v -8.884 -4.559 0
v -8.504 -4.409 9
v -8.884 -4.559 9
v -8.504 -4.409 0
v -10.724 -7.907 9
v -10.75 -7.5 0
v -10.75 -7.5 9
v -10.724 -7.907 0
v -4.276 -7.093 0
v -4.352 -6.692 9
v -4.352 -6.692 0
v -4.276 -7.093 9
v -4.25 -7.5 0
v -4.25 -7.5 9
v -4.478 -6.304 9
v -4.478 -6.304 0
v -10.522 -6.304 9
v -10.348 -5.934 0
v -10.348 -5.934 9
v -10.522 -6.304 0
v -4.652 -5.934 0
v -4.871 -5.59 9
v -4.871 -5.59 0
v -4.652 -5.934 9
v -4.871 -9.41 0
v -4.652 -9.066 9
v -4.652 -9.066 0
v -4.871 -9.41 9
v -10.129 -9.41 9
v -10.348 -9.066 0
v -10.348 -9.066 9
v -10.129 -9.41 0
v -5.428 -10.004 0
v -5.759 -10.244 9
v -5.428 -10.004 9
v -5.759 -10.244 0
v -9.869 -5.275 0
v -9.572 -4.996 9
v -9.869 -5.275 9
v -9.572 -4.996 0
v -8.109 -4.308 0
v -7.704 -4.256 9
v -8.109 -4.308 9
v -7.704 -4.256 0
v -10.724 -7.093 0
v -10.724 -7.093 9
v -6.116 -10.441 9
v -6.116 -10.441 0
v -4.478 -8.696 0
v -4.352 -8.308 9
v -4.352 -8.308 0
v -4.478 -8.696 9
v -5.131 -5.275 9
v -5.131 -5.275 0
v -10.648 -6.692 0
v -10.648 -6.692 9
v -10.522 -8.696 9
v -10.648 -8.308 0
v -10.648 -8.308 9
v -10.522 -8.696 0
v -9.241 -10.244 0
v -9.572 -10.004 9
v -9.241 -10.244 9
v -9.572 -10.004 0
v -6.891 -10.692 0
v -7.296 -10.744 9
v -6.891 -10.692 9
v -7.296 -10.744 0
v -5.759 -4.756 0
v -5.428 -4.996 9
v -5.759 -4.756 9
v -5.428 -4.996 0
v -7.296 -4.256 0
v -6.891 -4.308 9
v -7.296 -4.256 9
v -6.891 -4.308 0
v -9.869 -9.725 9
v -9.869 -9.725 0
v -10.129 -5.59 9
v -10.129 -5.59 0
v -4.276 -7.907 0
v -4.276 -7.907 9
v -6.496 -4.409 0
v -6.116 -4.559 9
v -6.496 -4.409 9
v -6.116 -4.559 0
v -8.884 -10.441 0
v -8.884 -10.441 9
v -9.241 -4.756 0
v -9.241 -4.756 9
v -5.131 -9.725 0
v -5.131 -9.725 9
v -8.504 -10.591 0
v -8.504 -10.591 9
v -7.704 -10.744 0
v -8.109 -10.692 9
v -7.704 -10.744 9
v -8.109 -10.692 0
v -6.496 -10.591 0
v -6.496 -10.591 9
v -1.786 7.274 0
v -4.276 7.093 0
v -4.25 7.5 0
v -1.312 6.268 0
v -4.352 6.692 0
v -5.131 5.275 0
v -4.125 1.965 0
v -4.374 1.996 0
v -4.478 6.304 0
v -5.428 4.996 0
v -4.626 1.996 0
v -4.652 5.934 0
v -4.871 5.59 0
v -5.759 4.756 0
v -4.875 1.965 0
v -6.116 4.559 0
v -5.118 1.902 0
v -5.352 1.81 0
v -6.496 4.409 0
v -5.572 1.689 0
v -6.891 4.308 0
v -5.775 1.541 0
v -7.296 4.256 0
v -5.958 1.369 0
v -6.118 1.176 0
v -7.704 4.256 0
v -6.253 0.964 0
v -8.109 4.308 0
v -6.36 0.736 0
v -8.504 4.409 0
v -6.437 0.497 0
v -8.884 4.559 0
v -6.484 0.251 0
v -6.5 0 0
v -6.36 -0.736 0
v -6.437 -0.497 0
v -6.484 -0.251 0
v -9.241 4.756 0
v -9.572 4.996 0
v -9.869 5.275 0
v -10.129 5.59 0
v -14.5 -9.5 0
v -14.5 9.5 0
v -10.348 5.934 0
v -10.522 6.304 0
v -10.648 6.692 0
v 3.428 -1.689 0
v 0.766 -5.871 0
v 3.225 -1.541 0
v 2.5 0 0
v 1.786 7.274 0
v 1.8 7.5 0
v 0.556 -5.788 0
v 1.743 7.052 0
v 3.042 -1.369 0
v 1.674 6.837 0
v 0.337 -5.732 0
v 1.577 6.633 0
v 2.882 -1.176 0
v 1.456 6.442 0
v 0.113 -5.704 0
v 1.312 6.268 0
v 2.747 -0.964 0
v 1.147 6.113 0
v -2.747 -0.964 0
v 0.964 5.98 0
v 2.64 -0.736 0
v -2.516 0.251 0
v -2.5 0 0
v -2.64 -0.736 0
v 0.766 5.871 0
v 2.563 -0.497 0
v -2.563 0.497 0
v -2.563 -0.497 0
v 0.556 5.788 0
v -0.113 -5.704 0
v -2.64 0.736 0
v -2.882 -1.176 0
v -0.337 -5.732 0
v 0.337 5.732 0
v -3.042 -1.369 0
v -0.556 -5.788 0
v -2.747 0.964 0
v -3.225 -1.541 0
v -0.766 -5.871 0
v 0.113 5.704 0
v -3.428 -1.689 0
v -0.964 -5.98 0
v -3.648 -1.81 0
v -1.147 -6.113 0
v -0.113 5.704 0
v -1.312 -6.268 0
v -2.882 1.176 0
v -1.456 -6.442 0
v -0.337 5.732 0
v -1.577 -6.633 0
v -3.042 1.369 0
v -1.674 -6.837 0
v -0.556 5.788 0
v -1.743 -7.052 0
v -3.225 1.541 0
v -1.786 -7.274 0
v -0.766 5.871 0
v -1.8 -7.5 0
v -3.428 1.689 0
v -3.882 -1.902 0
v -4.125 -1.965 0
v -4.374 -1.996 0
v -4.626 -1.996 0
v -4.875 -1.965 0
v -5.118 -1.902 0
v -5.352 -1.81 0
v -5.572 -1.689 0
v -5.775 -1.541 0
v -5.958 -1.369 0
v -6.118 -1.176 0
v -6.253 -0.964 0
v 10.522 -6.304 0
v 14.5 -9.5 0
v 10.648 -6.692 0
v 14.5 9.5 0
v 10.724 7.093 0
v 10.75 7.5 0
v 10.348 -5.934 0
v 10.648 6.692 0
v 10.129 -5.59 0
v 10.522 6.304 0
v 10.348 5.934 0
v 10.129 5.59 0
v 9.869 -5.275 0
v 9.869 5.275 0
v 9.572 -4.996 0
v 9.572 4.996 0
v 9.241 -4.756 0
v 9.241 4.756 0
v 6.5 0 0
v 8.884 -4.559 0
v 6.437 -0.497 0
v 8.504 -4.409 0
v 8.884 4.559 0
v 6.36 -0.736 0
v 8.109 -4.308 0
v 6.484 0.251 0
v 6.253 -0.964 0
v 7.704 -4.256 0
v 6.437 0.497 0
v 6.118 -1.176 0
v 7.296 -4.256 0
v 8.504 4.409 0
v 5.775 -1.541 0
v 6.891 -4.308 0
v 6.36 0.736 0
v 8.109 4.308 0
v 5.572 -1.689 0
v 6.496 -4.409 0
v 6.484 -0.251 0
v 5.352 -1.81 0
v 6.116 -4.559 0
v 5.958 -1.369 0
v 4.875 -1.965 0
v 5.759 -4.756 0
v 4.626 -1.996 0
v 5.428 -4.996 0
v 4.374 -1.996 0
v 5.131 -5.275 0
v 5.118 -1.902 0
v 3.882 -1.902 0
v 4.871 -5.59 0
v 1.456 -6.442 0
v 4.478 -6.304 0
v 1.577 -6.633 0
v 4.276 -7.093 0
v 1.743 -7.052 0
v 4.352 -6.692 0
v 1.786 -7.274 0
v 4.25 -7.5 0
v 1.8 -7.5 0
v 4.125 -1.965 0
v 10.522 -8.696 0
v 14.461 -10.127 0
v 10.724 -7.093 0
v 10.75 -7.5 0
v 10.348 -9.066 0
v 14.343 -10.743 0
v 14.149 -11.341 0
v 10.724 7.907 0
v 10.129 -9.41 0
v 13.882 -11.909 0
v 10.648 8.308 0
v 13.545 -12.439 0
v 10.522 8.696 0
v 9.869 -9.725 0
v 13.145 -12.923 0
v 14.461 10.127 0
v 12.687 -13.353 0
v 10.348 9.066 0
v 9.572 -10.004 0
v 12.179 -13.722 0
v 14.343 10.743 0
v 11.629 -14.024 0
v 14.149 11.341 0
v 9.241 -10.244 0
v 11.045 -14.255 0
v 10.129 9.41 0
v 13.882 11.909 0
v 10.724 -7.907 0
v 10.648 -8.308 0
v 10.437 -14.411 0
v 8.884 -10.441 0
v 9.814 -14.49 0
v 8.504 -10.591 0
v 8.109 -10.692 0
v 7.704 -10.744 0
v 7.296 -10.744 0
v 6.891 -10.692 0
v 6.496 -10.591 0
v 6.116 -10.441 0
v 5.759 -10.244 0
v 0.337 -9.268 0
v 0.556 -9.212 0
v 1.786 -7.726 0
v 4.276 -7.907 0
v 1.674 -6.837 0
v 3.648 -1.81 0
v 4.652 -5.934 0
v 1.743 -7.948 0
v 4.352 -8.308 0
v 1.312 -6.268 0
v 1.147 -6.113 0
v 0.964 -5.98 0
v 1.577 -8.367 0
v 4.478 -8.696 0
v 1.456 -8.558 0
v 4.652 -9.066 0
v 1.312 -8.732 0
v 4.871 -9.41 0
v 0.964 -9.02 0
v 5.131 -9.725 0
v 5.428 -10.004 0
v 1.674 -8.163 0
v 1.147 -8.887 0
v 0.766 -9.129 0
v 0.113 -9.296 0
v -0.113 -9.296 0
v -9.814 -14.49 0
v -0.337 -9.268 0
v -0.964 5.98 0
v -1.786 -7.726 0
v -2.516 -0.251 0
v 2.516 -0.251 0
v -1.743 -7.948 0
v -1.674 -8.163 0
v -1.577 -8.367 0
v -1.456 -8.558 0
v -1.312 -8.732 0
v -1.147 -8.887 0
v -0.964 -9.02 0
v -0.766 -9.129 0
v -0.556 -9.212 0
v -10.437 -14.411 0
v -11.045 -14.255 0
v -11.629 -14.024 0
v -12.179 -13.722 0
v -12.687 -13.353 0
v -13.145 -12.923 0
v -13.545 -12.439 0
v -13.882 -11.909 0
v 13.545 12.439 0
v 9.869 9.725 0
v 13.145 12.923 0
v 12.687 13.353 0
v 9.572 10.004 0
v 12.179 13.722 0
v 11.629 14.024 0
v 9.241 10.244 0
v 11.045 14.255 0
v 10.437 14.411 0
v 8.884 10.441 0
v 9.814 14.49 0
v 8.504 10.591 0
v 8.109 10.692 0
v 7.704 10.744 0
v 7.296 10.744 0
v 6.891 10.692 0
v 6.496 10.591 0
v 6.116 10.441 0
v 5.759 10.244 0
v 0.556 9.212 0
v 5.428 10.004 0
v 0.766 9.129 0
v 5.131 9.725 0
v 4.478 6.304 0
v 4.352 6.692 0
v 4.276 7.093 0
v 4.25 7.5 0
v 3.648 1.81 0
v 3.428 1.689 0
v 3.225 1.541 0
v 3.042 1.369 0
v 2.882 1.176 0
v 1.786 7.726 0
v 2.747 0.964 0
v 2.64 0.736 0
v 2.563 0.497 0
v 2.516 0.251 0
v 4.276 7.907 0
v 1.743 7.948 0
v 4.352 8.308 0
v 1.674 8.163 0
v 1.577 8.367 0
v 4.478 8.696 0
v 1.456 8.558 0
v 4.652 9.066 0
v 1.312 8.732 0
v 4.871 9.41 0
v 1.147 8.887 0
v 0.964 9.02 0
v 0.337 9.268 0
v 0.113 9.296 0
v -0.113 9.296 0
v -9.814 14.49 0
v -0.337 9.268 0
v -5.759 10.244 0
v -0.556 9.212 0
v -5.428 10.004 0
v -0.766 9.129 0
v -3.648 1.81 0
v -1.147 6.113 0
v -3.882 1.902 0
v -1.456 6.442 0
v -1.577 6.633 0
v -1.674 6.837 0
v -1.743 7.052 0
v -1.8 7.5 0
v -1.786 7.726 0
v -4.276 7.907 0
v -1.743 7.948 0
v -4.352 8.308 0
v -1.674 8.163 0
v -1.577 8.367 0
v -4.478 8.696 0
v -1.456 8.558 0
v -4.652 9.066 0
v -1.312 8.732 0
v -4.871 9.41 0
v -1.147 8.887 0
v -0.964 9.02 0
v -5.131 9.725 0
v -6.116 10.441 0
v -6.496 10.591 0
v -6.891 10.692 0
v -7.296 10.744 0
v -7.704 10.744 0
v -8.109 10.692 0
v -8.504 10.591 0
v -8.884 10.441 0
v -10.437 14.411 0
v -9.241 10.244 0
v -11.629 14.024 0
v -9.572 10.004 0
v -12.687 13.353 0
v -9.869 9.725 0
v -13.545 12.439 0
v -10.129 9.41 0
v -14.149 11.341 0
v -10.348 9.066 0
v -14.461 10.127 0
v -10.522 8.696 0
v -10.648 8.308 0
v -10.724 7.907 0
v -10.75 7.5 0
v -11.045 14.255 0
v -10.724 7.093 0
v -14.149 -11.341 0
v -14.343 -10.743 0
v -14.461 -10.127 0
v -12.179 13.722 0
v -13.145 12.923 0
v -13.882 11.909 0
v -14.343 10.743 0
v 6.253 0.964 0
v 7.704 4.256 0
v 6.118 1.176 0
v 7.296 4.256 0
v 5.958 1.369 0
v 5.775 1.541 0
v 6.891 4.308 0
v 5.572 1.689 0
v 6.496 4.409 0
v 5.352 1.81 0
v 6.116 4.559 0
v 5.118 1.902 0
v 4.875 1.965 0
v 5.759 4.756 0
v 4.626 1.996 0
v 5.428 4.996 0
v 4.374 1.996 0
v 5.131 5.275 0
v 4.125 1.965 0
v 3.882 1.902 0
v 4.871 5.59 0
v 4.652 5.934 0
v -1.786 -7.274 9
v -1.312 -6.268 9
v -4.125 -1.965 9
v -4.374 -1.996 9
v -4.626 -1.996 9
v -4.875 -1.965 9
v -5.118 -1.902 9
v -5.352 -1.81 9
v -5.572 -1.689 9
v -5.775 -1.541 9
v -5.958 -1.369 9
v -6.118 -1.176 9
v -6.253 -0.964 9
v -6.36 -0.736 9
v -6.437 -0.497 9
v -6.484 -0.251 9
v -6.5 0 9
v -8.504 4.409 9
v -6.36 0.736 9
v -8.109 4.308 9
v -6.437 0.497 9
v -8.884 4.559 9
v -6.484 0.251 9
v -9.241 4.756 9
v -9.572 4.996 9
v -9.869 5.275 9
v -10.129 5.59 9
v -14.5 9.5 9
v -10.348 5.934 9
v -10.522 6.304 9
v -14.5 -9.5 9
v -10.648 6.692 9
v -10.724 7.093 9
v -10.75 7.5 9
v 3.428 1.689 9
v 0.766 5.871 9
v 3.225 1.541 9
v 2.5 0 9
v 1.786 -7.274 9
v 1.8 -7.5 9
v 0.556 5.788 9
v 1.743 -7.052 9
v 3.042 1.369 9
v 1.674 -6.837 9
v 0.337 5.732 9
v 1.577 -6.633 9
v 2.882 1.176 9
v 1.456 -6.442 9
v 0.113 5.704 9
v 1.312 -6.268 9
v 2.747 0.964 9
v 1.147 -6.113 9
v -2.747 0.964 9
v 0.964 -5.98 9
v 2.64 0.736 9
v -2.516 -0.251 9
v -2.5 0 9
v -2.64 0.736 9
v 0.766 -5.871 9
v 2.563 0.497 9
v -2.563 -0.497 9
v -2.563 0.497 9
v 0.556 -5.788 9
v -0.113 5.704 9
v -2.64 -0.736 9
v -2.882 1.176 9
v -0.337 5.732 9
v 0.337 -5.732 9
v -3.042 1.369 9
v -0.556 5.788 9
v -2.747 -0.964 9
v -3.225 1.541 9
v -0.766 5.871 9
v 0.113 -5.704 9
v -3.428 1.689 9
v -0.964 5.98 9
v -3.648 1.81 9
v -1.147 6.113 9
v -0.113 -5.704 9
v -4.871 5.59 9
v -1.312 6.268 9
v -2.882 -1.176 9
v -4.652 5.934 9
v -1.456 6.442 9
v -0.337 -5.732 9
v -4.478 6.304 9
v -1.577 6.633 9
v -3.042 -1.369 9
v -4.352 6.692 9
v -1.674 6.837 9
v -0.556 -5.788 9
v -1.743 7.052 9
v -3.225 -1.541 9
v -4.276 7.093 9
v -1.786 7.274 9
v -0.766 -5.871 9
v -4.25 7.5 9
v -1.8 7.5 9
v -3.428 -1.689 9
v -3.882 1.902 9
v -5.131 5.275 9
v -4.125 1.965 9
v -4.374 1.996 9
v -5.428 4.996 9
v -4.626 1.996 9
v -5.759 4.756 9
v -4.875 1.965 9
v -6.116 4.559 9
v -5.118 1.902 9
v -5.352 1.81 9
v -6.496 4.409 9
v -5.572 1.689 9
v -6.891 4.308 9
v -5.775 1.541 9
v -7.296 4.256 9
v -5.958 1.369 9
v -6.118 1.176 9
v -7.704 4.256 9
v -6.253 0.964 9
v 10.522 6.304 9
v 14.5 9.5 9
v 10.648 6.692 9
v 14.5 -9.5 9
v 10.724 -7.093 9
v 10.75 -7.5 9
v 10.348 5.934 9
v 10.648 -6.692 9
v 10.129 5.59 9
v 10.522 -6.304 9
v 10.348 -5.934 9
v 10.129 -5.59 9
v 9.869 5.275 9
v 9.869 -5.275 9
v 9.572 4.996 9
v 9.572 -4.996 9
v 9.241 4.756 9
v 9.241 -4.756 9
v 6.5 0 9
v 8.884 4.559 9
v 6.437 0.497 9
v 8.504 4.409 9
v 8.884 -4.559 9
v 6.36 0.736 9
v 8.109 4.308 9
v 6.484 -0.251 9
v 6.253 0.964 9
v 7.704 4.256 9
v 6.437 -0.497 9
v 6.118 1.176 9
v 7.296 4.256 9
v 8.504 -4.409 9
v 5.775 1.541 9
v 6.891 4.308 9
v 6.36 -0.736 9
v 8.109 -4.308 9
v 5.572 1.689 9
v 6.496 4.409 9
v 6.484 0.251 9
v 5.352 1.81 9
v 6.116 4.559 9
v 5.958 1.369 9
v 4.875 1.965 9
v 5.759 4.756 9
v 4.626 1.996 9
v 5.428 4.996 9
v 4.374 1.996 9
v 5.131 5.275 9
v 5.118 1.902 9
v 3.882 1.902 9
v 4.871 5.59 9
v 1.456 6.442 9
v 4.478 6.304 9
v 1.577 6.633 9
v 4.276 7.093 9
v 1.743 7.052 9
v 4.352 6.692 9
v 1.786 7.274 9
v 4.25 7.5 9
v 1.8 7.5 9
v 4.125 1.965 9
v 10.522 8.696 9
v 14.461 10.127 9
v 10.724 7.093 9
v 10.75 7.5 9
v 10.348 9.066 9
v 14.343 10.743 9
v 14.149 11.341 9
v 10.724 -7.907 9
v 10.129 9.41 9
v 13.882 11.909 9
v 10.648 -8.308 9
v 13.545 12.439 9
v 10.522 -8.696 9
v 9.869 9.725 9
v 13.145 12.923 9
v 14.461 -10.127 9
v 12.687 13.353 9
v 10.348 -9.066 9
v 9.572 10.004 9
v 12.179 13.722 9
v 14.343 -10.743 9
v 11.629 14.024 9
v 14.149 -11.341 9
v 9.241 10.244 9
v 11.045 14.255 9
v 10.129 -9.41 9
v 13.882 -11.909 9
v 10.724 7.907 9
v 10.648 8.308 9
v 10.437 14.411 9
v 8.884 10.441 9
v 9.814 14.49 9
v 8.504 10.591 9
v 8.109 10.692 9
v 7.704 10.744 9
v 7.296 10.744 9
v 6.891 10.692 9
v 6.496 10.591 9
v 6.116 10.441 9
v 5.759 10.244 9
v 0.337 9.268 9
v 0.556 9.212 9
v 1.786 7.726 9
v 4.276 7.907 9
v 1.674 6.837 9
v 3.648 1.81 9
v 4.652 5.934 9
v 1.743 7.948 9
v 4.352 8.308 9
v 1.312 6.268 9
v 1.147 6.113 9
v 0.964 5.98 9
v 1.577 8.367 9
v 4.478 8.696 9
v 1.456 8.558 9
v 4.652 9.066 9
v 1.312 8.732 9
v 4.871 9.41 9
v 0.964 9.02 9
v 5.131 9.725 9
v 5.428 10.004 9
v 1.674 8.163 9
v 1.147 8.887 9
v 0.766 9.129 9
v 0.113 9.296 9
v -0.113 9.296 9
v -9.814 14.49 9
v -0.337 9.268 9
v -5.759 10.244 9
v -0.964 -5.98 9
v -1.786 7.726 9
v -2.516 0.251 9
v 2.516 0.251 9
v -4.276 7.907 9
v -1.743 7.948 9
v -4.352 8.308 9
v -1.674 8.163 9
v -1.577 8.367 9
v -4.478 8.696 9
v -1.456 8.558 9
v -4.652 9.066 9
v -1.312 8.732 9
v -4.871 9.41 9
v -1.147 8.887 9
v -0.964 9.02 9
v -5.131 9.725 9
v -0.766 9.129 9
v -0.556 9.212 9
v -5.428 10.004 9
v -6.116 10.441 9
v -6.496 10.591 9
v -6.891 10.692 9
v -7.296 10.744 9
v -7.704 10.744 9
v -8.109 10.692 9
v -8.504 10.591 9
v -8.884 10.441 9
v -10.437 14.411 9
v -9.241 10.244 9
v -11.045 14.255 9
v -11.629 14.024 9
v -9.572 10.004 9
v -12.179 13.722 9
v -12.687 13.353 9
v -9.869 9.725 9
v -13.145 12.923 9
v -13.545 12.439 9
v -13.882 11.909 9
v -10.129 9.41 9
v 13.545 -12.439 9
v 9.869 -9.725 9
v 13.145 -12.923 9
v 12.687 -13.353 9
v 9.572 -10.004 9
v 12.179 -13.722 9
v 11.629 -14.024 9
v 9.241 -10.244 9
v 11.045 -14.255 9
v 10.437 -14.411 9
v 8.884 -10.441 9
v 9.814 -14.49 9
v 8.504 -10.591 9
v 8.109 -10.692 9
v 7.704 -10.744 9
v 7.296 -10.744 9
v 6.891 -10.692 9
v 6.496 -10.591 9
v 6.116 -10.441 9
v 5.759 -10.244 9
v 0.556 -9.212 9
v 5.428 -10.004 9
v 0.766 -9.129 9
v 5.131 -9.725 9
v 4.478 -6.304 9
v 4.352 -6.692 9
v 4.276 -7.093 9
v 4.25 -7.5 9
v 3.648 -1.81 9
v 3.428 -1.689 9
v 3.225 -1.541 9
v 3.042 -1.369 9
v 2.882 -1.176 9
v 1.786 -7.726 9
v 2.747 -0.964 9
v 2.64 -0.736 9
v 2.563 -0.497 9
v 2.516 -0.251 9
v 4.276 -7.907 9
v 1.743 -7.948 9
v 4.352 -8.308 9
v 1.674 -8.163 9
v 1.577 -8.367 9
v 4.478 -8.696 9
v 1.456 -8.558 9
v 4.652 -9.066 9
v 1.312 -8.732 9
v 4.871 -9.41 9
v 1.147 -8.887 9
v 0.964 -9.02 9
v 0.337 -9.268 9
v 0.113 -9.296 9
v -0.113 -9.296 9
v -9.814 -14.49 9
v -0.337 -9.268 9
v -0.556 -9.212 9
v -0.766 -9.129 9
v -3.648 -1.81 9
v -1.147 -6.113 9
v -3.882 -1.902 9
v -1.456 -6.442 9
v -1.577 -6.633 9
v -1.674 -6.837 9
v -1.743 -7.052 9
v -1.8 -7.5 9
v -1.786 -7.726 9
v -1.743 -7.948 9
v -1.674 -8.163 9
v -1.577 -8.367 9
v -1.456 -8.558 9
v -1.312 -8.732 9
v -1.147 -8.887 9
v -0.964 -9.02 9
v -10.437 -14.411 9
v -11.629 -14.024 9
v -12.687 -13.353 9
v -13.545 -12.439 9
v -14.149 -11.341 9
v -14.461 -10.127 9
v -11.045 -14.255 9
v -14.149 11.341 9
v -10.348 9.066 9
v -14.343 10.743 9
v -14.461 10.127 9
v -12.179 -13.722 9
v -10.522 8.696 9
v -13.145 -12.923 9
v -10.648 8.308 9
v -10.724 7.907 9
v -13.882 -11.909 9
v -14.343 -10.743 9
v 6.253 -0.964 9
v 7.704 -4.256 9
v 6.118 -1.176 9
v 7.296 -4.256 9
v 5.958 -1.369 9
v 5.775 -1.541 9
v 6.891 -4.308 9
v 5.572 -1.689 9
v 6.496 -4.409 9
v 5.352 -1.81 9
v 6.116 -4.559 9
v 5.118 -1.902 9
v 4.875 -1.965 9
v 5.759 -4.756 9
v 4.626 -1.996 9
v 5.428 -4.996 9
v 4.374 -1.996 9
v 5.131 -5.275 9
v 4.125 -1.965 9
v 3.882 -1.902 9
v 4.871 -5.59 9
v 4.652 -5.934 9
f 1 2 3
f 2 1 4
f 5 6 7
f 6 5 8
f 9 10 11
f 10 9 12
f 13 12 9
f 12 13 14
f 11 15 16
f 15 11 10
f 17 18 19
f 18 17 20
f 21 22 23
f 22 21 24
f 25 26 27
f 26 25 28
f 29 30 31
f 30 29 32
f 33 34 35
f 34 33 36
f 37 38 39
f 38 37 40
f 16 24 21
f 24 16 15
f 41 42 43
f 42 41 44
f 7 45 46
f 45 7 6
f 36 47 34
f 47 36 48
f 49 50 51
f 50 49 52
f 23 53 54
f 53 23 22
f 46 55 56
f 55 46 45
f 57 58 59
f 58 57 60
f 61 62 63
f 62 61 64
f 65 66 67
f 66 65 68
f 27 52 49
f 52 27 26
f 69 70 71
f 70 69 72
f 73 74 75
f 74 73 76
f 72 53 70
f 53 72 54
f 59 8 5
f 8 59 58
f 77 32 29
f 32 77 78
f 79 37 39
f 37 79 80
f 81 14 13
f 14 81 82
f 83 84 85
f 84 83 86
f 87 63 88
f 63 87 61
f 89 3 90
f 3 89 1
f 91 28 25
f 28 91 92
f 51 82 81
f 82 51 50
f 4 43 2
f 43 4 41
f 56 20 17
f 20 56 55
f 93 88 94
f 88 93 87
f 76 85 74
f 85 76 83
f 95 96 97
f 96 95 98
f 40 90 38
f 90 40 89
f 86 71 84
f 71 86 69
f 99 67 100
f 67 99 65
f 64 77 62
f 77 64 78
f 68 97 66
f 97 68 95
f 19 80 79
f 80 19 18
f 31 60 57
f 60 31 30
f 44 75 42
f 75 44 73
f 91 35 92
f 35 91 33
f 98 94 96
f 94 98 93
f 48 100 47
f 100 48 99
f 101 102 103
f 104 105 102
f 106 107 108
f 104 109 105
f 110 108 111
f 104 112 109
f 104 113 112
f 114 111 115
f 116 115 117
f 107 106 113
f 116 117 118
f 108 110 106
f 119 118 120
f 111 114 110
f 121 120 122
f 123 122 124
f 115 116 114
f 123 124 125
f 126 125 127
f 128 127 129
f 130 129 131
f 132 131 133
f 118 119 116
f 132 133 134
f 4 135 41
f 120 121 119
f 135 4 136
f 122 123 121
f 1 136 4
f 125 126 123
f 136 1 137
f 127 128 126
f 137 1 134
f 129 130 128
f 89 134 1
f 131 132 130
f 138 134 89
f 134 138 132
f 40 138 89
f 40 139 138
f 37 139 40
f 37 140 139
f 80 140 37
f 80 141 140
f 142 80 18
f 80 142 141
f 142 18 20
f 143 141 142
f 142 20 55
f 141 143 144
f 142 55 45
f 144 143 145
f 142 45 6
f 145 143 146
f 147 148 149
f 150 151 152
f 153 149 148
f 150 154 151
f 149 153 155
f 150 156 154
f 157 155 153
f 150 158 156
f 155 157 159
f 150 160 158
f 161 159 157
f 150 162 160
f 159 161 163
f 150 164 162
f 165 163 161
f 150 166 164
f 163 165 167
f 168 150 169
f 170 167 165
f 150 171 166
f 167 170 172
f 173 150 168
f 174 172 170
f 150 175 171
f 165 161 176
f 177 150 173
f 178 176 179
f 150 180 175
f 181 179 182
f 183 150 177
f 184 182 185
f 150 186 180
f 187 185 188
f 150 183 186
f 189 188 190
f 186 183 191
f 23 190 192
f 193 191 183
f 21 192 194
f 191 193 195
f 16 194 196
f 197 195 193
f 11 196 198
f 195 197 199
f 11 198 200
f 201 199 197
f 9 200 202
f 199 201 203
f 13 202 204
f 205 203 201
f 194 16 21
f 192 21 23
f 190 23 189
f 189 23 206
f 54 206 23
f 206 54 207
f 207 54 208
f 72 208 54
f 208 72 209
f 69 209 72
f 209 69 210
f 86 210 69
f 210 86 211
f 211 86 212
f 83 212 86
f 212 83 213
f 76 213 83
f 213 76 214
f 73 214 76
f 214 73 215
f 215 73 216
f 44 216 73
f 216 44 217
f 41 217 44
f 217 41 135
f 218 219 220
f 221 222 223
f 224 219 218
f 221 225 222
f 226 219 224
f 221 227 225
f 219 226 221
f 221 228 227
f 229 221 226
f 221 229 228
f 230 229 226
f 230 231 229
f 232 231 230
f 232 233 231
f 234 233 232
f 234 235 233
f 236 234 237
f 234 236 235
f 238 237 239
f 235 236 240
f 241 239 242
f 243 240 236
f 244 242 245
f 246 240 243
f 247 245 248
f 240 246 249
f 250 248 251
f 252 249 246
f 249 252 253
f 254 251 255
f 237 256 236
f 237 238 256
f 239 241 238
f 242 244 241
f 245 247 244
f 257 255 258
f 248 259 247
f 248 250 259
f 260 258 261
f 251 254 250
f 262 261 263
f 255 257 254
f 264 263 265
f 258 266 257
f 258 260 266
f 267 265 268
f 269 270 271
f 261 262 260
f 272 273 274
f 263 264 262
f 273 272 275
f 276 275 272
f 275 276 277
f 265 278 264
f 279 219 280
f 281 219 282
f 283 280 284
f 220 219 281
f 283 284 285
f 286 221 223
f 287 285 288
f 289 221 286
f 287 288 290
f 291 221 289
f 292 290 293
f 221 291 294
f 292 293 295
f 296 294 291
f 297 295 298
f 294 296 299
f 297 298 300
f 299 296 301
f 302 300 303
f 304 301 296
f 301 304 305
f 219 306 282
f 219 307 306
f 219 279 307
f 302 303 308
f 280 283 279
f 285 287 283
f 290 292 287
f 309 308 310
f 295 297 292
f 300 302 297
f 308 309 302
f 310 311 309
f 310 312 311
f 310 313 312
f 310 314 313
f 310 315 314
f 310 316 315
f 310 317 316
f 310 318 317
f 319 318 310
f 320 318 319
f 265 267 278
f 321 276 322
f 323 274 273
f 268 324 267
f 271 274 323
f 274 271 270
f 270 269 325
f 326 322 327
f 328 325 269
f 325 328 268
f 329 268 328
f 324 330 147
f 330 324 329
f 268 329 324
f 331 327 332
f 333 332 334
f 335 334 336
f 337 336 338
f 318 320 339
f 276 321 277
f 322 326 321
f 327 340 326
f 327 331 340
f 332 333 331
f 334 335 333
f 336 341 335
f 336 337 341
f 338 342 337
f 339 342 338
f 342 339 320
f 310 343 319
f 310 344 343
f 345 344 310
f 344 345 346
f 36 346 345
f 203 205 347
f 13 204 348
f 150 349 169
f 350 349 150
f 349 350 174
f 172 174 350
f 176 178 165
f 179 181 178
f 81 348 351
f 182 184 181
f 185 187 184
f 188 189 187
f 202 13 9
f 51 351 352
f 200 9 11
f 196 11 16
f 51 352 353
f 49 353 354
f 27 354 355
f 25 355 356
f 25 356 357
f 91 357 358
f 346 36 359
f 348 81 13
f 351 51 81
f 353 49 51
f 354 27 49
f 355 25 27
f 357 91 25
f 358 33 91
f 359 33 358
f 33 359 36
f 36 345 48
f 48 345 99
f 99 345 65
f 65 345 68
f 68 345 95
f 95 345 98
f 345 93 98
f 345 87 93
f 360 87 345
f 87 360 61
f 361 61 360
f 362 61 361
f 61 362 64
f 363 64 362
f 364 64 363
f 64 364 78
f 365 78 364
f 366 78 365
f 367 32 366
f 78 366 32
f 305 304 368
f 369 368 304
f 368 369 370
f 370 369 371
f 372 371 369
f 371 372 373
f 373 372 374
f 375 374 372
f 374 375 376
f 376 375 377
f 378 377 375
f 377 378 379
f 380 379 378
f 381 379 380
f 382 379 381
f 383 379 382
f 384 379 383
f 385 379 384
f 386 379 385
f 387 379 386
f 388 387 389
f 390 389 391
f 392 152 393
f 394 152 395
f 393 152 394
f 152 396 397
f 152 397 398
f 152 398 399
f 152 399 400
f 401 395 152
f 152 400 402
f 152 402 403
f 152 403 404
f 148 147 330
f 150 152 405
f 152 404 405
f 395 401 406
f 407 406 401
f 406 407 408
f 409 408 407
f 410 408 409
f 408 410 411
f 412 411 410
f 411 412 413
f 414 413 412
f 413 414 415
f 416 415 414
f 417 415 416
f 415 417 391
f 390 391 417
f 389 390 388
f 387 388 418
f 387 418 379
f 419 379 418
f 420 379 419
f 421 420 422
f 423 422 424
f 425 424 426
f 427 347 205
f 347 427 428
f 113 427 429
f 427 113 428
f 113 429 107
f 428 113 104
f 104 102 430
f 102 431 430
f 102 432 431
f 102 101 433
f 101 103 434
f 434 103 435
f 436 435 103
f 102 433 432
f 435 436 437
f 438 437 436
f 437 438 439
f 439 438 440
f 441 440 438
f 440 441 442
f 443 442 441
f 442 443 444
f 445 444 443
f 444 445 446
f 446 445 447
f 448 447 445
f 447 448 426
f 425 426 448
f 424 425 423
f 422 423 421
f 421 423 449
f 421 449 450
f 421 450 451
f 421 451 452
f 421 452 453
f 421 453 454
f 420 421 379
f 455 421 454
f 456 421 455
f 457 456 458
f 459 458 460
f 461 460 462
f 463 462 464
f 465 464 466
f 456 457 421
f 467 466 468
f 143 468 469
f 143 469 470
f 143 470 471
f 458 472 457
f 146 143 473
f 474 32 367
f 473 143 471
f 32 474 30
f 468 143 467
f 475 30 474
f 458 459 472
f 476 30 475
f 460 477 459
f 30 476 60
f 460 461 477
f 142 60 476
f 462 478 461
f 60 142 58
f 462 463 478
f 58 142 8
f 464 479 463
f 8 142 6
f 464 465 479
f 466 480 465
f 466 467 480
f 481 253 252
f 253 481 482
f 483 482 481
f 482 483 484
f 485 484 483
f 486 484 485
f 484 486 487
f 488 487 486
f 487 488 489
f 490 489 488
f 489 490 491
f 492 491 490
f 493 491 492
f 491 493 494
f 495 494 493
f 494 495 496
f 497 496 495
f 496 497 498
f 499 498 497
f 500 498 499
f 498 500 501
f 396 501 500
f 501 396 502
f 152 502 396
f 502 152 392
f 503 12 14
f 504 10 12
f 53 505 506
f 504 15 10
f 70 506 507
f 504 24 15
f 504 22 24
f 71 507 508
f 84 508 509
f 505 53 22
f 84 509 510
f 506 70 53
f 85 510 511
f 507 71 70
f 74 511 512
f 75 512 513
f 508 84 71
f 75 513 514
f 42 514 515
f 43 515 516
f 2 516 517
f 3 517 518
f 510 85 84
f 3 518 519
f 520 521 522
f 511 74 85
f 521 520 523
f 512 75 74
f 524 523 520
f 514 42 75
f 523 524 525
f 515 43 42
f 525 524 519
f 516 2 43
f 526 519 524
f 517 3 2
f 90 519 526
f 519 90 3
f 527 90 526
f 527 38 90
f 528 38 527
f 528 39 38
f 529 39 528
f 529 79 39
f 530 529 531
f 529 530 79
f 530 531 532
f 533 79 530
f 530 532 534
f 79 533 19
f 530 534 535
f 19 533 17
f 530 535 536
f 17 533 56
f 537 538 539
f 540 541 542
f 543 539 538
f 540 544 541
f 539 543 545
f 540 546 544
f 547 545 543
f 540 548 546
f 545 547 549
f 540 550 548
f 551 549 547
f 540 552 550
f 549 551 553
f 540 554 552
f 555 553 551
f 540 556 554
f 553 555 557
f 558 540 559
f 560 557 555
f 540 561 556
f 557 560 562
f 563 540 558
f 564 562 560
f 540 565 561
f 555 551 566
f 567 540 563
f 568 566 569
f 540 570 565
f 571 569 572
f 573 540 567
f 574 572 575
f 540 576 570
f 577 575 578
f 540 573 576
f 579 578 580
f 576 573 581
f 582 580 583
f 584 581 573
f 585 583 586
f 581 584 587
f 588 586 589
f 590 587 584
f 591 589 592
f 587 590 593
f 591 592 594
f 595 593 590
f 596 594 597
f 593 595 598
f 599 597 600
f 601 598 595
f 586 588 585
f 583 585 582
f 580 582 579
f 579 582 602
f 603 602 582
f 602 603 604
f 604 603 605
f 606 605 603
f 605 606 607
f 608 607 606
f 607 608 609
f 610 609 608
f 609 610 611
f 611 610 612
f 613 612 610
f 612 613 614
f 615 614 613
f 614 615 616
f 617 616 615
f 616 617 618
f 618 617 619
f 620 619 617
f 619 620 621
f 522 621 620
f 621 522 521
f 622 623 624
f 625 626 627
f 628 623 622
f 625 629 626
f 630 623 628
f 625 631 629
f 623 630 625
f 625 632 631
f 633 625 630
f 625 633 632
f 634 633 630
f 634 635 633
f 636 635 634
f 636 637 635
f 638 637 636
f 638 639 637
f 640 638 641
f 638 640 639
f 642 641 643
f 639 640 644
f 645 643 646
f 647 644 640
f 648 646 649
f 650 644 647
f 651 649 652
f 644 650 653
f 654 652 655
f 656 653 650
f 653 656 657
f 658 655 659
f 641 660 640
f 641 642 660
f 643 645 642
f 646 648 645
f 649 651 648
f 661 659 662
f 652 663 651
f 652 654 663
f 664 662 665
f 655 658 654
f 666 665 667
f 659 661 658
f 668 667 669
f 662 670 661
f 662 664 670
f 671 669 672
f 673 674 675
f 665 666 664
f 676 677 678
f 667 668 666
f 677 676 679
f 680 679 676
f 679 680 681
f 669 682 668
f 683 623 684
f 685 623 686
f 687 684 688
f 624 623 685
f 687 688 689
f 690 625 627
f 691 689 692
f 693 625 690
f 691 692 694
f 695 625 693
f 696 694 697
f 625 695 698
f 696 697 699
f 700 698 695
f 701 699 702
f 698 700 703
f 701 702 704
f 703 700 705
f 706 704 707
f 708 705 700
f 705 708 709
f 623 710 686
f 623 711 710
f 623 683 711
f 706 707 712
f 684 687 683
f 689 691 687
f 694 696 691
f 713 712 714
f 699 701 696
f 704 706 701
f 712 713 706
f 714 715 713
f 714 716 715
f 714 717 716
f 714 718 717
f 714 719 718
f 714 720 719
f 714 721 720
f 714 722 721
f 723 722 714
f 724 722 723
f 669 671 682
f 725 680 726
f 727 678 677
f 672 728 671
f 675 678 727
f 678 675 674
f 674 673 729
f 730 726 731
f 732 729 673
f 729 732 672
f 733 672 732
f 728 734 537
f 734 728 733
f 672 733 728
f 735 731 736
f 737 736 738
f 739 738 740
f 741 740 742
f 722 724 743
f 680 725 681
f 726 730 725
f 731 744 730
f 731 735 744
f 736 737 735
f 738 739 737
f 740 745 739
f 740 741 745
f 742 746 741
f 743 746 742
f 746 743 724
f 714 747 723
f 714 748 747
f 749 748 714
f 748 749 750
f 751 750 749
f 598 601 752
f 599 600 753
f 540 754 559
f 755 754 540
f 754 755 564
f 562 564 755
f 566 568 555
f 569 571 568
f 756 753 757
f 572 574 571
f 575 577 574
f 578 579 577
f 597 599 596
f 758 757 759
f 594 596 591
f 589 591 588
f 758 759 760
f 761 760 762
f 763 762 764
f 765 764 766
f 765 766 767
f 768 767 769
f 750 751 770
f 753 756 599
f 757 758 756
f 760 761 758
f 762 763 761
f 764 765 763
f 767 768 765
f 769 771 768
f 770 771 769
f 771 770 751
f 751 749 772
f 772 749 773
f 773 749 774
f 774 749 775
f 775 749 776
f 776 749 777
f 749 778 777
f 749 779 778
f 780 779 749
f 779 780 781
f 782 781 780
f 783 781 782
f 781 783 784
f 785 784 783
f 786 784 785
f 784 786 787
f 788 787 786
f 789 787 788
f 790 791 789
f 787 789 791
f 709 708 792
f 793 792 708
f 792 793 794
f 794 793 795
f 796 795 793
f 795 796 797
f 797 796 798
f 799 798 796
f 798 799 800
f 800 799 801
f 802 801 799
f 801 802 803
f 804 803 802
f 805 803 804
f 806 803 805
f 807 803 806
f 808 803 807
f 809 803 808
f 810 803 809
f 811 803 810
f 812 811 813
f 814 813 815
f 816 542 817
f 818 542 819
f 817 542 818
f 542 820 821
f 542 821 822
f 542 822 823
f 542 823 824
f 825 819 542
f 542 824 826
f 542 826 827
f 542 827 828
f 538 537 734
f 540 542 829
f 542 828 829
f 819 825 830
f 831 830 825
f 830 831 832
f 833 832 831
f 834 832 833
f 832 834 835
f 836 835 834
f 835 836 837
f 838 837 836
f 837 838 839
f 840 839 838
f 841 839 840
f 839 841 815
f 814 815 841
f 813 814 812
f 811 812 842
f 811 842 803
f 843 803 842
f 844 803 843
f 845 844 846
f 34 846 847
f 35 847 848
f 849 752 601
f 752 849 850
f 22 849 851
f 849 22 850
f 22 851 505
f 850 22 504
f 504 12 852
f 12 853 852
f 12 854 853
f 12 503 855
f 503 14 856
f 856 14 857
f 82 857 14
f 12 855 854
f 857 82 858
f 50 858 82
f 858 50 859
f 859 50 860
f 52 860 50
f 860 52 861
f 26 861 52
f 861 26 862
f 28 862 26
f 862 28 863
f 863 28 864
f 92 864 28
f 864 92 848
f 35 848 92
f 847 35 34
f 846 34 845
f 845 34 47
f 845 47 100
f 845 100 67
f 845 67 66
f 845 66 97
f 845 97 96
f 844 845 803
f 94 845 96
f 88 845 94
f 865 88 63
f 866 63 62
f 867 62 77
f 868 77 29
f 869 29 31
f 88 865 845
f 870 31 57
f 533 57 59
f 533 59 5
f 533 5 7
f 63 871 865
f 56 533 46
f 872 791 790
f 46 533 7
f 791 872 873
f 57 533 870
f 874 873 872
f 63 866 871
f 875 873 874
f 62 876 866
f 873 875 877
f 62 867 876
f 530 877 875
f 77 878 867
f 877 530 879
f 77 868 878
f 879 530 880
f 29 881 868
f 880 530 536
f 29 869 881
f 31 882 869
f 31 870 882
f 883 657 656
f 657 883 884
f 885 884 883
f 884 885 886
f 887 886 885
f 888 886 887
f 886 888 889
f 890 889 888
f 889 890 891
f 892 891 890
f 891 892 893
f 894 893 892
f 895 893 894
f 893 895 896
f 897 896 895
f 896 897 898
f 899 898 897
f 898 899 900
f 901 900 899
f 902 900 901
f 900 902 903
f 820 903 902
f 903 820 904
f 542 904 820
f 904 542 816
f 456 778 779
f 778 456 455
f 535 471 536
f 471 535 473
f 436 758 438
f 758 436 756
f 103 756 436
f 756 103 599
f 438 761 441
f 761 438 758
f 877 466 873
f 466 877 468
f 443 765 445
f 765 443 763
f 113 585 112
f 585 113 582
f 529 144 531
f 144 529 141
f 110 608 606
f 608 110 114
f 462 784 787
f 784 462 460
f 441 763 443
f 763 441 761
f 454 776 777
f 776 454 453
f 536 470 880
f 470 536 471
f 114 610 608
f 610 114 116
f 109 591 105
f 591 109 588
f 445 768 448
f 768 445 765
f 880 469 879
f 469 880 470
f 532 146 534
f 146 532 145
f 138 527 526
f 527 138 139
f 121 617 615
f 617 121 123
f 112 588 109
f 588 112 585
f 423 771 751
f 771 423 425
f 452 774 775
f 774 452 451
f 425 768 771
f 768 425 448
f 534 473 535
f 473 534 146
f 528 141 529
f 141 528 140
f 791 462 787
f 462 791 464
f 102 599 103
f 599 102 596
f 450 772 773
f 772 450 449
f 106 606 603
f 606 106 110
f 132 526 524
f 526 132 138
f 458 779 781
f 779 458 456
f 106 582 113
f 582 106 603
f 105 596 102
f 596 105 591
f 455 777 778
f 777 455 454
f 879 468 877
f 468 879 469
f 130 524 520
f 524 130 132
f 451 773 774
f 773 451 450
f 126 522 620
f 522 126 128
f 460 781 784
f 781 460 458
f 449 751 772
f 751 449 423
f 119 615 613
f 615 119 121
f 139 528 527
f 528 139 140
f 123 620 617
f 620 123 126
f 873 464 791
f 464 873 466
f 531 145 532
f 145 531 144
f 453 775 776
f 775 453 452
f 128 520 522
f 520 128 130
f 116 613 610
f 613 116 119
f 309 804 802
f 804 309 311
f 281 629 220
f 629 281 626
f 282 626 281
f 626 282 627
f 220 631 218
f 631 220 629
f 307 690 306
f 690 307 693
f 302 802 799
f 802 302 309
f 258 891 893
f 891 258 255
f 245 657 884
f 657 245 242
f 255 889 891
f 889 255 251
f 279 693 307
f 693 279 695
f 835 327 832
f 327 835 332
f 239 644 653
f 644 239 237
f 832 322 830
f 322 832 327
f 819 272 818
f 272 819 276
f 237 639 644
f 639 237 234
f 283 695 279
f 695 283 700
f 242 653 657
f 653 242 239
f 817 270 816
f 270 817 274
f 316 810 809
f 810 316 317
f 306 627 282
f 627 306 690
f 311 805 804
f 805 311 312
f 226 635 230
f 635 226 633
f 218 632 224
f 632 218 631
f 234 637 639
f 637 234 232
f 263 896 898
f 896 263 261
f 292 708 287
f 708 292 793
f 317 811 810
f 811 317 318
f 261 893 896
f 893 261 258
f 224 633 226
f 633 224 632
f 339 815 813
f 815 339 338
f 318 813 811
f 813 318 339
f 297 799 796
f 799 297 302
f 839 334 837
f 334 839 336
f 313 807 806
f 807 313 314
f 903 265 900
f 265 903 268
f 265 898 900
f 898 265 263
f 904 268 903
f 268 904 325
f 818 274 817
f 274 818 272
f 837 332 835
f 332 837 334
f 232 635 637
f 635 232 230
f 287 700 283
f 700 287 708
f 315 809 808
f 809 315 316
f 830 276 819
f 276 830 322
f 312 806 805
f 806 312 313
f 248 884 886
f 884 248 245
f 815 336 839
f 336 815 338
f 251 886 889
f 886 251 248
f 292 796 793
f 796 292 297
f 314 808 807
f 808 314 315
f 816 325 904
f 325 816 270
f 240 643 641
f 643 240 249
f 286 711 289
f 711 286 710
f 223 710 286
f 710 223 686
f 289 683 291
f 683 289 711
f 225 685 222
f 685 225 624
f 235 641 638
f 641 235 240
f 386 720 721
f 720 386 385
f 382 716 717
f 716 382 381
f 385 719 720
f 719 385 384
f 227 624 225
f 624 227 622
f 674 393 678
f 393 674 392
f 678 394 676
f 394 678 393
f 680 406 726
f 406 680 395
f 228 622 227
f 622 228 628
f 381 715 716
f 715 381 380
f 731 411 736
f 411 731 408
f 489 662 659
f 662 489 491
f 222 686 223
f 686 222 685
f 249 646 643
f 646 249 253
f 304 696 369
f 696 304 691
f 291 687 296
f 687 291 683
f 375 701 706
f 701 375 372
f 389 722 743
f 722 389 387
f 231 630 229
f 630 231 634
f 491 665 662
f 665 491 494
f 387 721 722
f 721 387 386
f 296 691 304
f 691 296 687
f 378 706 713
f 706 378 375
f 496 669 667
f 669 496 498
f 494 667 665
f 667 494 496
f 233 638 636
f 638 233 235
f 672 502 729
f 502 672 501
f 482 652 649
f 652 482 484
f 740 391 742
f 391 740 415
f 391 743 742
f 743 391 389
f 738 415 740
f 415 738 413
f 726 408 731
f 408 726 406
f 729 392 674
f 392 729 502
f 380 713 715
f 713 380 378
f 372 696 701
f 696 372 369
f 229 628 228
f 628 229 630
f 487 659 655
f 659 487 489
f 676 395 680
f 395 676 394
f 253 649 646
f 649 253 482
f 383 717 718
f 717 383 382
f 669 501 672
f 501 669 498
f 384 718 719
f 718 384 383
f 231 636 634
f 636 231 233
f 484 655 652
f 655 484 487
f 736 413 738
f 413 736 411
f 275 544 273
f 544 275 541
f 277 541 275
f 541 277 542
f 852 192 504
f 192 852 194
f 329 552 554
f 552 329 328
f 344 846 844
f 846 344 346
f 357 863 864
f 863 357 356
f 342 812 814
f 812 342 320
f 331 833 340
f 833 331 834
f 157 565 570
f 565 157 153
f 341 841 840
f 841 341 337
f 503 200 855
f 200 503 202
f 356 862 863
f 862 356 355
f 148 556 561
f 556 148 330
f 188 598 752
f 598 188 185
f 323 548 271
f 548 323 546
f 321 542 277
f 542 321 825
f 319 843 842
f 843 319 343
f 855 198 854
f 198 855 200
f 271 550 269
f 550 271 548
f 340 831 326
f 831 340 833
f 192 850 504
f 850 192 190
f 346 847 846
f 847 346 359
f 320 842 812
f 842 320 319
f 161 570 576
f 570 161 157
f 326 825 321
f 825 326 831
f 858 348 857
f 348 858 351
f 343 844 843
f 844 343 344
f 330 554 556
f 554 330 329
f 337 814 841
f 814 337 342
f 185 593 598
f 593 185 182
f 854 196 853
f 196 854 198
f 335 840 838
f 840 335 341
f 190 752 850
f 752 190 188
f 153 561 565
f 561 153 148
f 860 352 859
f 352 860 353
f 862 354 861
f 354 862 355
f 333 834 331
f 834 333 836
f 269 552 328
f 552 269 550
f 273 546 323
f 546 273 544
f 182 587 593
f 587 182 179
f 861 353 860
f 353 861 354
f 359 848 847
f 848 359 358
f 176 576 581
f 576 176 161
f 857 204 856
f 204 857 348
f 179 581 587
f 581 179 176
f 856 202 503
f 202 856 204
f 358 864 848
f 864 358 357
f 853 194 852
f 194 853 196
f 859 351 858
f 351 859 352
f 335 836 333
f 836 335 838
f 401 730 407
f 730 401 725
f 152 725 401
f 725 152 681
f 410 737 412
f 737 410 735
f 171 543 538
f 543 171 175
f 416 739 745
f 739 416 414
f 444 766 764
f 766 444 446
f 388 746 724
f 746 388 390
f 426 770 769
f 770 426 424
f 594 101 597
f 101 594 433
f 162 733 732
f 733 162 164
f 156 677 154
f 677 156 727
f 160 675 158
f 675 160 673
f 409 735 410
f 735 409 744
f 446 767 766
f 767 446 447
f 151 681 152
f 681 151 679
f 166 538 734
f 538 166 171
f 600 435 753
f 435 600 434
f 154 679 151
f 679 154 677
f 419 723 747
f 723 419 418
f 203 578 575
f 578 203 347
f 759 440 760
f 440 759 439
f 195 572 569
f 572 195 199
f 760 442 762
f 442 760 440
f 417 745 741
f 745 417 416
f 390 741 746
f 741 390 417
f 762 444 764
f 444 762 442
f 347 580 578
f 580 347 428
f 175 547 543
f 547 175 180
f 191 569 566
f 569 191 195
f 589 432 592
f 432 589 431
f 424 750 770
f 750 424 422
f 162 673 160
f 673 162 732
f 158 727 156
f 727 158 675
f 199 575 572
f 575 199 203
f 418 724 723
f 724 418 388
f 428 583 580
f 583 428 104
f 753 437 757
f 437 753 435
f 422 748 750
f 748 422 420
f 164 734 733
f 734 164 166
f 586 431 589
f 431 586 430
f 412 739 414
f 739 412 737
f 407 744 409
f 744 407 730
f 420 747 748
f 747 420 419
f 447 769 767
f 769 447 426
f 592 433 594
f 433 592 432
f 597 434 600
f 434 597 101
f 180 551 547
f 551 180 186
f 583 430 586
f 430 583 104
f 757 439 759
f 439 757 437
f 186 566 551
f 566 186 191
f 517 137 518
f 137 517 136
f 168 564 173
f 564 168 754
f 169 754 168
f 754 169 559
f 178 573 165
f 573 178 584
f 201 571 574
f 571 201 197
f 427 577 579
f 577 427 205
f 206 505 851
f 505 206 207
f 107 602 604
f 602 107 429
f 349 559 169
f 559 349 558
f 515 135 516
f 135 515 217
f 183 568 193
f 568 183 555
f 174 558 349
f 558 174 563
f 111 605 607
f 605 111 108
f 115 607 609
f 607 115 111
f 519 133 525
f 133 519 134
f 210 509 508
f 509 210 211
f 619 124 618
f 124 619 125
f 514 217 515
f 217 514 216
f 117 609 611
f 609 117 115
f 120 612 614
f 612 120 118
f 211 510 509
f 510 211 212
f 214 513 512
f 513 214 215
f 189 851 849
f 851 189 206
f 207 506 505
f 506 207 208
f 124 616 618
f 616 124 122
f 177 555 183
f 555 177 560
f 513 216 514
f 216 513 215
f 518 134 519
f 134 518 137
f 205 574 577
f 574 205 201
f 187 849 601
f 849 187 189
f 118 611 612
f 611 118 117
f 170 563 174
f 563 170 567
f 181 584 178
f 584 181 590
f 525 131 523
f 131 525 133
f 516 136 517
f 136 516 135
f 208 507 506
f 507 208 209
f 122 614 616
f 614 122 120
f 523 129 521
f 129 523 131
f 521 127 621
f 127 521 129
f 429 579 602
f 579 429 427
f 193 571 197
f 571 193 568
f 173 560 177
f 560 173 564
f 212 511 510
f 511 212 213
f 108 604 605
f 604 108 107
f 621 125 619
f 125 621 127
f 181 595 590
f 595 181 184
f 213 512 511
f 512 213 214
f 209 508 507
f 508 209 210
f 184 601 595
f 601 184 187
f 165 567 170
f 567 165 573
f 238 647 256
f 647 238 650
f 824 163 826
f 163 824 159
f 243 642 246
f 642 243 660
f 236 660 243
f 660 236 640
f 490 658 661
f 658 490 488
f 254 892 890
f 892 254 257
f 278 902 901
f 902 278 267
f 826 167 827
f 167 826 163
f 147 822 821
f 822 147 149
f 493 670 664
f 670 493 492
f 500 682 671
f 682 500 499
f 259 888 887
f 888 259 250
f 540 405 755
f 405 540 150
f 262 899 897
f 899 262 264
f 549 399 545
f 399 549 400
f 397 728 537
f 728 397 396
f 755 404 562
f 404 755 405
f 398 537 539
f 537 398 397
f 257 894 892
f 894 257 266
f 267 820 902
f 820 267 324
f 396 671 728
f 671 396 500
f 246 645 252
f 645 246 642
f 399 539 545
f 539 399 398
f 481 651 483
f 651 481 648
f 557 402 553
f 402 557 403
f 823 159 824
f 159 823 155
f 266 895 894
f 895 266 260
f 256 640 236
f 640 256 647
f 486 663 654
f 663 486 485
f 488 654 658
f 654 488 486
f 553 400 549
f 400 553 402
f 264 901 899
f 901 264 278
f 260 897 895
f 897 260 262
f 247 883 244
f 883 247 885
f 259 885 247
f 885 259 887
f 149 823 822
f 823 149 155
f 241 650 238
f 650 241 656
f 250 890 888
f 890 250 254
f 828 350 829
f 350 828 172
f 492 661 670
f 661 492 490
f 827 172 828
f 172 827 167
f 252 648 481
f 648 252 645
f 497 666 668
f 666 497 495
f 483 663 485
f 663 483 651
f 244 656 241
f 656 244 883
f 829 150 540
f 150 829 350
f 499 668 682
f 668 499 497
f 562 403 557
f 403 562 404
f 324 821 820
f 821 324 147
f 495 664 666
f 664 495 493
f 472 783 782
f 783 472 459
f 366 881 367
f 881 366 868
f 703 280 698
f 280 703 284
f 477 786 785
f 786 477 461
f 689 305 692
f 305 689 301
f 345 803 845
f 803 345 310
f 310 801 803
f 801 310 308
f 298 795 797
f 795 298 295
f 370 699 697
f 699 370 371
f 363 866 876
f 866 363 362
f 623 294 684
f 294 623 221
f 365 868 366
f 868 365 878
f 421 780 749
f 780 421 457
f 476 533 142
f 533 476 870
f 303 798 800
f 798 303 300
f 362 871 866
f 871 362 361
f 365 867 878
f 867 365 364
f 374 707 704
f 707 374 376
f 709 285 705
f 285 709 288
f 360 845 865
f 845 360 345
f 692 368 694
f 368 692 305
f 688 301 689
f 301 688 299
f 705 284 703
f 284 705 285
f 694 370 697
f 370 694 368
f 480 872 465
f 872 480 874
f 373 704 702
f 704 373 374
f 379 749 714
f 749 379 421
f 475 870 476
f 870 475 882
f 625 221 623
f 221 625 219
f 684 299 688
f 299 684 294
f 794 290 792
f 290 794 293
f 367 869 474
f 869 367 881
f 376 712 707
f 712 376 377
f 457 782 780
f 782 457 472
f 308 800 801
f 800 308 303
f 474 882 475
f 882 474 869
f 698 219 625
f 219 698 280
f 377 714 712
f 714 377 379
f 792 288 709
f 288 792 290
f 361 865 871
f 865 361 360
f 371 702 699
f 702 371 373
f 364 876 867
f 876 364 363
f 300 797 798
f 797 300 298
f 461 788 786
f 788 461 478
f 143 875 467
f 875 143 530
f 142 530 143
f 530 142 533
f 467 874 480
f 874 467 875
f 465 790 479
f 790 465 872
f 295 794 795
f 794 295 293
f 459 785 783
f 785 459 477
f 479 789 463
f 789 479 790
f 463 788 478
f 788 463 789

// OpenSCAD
$fn = 50;

difference() {
	union() {
		hull() {
			translate(v = [-9.5, 9.5, 0]) {
				cylinder(h = 9, r = 5);
			}
			translate(v = [9.5, 9.5, 0]) {
				cylinder(h = 9, r = 5);
			}
			translate(v = [-9.5, -9.5, 0]) {
				cylinder(h = 9, r = 5);
			}
			translate(v = [9.5, -9.5, 0]) {
				cylinder(h = 9, r = 5);
			}
		}
	}
	union() {
		translate(v = [-7.5, -7.5, 0]) {
			cylinder(h = 9, r = 3.25);
		}
		translate(v = [-7.5, 7.5, 0]) {
			cylinder(h = 9, r = 3.25);
		}
		translate(v = [7.5, -7.5, 0]) {
			cylinder(h = 9, r = 3.25);
		}
		translate(v = [7.5, 7.5, 0]) {
			cylinder(h = 9, r = 3.25);
		}
		translate(v = [0.0, -7.5, 0]) {
			cylinder(h = 9, r = 1.8);
		}
		translate(v = [0.0, 7.5, 0]) {
			cylinder(h = 9, r = 1.8);
		}
		translate(v = [-4.5, 0, 0.0]) {
			cylinder(h = 9, r = 2.0);
		}
		translate(v = [4.5, 0, 0.0]) {
			cylinder(h = 9, r = 2.0);
		}
	}
}
